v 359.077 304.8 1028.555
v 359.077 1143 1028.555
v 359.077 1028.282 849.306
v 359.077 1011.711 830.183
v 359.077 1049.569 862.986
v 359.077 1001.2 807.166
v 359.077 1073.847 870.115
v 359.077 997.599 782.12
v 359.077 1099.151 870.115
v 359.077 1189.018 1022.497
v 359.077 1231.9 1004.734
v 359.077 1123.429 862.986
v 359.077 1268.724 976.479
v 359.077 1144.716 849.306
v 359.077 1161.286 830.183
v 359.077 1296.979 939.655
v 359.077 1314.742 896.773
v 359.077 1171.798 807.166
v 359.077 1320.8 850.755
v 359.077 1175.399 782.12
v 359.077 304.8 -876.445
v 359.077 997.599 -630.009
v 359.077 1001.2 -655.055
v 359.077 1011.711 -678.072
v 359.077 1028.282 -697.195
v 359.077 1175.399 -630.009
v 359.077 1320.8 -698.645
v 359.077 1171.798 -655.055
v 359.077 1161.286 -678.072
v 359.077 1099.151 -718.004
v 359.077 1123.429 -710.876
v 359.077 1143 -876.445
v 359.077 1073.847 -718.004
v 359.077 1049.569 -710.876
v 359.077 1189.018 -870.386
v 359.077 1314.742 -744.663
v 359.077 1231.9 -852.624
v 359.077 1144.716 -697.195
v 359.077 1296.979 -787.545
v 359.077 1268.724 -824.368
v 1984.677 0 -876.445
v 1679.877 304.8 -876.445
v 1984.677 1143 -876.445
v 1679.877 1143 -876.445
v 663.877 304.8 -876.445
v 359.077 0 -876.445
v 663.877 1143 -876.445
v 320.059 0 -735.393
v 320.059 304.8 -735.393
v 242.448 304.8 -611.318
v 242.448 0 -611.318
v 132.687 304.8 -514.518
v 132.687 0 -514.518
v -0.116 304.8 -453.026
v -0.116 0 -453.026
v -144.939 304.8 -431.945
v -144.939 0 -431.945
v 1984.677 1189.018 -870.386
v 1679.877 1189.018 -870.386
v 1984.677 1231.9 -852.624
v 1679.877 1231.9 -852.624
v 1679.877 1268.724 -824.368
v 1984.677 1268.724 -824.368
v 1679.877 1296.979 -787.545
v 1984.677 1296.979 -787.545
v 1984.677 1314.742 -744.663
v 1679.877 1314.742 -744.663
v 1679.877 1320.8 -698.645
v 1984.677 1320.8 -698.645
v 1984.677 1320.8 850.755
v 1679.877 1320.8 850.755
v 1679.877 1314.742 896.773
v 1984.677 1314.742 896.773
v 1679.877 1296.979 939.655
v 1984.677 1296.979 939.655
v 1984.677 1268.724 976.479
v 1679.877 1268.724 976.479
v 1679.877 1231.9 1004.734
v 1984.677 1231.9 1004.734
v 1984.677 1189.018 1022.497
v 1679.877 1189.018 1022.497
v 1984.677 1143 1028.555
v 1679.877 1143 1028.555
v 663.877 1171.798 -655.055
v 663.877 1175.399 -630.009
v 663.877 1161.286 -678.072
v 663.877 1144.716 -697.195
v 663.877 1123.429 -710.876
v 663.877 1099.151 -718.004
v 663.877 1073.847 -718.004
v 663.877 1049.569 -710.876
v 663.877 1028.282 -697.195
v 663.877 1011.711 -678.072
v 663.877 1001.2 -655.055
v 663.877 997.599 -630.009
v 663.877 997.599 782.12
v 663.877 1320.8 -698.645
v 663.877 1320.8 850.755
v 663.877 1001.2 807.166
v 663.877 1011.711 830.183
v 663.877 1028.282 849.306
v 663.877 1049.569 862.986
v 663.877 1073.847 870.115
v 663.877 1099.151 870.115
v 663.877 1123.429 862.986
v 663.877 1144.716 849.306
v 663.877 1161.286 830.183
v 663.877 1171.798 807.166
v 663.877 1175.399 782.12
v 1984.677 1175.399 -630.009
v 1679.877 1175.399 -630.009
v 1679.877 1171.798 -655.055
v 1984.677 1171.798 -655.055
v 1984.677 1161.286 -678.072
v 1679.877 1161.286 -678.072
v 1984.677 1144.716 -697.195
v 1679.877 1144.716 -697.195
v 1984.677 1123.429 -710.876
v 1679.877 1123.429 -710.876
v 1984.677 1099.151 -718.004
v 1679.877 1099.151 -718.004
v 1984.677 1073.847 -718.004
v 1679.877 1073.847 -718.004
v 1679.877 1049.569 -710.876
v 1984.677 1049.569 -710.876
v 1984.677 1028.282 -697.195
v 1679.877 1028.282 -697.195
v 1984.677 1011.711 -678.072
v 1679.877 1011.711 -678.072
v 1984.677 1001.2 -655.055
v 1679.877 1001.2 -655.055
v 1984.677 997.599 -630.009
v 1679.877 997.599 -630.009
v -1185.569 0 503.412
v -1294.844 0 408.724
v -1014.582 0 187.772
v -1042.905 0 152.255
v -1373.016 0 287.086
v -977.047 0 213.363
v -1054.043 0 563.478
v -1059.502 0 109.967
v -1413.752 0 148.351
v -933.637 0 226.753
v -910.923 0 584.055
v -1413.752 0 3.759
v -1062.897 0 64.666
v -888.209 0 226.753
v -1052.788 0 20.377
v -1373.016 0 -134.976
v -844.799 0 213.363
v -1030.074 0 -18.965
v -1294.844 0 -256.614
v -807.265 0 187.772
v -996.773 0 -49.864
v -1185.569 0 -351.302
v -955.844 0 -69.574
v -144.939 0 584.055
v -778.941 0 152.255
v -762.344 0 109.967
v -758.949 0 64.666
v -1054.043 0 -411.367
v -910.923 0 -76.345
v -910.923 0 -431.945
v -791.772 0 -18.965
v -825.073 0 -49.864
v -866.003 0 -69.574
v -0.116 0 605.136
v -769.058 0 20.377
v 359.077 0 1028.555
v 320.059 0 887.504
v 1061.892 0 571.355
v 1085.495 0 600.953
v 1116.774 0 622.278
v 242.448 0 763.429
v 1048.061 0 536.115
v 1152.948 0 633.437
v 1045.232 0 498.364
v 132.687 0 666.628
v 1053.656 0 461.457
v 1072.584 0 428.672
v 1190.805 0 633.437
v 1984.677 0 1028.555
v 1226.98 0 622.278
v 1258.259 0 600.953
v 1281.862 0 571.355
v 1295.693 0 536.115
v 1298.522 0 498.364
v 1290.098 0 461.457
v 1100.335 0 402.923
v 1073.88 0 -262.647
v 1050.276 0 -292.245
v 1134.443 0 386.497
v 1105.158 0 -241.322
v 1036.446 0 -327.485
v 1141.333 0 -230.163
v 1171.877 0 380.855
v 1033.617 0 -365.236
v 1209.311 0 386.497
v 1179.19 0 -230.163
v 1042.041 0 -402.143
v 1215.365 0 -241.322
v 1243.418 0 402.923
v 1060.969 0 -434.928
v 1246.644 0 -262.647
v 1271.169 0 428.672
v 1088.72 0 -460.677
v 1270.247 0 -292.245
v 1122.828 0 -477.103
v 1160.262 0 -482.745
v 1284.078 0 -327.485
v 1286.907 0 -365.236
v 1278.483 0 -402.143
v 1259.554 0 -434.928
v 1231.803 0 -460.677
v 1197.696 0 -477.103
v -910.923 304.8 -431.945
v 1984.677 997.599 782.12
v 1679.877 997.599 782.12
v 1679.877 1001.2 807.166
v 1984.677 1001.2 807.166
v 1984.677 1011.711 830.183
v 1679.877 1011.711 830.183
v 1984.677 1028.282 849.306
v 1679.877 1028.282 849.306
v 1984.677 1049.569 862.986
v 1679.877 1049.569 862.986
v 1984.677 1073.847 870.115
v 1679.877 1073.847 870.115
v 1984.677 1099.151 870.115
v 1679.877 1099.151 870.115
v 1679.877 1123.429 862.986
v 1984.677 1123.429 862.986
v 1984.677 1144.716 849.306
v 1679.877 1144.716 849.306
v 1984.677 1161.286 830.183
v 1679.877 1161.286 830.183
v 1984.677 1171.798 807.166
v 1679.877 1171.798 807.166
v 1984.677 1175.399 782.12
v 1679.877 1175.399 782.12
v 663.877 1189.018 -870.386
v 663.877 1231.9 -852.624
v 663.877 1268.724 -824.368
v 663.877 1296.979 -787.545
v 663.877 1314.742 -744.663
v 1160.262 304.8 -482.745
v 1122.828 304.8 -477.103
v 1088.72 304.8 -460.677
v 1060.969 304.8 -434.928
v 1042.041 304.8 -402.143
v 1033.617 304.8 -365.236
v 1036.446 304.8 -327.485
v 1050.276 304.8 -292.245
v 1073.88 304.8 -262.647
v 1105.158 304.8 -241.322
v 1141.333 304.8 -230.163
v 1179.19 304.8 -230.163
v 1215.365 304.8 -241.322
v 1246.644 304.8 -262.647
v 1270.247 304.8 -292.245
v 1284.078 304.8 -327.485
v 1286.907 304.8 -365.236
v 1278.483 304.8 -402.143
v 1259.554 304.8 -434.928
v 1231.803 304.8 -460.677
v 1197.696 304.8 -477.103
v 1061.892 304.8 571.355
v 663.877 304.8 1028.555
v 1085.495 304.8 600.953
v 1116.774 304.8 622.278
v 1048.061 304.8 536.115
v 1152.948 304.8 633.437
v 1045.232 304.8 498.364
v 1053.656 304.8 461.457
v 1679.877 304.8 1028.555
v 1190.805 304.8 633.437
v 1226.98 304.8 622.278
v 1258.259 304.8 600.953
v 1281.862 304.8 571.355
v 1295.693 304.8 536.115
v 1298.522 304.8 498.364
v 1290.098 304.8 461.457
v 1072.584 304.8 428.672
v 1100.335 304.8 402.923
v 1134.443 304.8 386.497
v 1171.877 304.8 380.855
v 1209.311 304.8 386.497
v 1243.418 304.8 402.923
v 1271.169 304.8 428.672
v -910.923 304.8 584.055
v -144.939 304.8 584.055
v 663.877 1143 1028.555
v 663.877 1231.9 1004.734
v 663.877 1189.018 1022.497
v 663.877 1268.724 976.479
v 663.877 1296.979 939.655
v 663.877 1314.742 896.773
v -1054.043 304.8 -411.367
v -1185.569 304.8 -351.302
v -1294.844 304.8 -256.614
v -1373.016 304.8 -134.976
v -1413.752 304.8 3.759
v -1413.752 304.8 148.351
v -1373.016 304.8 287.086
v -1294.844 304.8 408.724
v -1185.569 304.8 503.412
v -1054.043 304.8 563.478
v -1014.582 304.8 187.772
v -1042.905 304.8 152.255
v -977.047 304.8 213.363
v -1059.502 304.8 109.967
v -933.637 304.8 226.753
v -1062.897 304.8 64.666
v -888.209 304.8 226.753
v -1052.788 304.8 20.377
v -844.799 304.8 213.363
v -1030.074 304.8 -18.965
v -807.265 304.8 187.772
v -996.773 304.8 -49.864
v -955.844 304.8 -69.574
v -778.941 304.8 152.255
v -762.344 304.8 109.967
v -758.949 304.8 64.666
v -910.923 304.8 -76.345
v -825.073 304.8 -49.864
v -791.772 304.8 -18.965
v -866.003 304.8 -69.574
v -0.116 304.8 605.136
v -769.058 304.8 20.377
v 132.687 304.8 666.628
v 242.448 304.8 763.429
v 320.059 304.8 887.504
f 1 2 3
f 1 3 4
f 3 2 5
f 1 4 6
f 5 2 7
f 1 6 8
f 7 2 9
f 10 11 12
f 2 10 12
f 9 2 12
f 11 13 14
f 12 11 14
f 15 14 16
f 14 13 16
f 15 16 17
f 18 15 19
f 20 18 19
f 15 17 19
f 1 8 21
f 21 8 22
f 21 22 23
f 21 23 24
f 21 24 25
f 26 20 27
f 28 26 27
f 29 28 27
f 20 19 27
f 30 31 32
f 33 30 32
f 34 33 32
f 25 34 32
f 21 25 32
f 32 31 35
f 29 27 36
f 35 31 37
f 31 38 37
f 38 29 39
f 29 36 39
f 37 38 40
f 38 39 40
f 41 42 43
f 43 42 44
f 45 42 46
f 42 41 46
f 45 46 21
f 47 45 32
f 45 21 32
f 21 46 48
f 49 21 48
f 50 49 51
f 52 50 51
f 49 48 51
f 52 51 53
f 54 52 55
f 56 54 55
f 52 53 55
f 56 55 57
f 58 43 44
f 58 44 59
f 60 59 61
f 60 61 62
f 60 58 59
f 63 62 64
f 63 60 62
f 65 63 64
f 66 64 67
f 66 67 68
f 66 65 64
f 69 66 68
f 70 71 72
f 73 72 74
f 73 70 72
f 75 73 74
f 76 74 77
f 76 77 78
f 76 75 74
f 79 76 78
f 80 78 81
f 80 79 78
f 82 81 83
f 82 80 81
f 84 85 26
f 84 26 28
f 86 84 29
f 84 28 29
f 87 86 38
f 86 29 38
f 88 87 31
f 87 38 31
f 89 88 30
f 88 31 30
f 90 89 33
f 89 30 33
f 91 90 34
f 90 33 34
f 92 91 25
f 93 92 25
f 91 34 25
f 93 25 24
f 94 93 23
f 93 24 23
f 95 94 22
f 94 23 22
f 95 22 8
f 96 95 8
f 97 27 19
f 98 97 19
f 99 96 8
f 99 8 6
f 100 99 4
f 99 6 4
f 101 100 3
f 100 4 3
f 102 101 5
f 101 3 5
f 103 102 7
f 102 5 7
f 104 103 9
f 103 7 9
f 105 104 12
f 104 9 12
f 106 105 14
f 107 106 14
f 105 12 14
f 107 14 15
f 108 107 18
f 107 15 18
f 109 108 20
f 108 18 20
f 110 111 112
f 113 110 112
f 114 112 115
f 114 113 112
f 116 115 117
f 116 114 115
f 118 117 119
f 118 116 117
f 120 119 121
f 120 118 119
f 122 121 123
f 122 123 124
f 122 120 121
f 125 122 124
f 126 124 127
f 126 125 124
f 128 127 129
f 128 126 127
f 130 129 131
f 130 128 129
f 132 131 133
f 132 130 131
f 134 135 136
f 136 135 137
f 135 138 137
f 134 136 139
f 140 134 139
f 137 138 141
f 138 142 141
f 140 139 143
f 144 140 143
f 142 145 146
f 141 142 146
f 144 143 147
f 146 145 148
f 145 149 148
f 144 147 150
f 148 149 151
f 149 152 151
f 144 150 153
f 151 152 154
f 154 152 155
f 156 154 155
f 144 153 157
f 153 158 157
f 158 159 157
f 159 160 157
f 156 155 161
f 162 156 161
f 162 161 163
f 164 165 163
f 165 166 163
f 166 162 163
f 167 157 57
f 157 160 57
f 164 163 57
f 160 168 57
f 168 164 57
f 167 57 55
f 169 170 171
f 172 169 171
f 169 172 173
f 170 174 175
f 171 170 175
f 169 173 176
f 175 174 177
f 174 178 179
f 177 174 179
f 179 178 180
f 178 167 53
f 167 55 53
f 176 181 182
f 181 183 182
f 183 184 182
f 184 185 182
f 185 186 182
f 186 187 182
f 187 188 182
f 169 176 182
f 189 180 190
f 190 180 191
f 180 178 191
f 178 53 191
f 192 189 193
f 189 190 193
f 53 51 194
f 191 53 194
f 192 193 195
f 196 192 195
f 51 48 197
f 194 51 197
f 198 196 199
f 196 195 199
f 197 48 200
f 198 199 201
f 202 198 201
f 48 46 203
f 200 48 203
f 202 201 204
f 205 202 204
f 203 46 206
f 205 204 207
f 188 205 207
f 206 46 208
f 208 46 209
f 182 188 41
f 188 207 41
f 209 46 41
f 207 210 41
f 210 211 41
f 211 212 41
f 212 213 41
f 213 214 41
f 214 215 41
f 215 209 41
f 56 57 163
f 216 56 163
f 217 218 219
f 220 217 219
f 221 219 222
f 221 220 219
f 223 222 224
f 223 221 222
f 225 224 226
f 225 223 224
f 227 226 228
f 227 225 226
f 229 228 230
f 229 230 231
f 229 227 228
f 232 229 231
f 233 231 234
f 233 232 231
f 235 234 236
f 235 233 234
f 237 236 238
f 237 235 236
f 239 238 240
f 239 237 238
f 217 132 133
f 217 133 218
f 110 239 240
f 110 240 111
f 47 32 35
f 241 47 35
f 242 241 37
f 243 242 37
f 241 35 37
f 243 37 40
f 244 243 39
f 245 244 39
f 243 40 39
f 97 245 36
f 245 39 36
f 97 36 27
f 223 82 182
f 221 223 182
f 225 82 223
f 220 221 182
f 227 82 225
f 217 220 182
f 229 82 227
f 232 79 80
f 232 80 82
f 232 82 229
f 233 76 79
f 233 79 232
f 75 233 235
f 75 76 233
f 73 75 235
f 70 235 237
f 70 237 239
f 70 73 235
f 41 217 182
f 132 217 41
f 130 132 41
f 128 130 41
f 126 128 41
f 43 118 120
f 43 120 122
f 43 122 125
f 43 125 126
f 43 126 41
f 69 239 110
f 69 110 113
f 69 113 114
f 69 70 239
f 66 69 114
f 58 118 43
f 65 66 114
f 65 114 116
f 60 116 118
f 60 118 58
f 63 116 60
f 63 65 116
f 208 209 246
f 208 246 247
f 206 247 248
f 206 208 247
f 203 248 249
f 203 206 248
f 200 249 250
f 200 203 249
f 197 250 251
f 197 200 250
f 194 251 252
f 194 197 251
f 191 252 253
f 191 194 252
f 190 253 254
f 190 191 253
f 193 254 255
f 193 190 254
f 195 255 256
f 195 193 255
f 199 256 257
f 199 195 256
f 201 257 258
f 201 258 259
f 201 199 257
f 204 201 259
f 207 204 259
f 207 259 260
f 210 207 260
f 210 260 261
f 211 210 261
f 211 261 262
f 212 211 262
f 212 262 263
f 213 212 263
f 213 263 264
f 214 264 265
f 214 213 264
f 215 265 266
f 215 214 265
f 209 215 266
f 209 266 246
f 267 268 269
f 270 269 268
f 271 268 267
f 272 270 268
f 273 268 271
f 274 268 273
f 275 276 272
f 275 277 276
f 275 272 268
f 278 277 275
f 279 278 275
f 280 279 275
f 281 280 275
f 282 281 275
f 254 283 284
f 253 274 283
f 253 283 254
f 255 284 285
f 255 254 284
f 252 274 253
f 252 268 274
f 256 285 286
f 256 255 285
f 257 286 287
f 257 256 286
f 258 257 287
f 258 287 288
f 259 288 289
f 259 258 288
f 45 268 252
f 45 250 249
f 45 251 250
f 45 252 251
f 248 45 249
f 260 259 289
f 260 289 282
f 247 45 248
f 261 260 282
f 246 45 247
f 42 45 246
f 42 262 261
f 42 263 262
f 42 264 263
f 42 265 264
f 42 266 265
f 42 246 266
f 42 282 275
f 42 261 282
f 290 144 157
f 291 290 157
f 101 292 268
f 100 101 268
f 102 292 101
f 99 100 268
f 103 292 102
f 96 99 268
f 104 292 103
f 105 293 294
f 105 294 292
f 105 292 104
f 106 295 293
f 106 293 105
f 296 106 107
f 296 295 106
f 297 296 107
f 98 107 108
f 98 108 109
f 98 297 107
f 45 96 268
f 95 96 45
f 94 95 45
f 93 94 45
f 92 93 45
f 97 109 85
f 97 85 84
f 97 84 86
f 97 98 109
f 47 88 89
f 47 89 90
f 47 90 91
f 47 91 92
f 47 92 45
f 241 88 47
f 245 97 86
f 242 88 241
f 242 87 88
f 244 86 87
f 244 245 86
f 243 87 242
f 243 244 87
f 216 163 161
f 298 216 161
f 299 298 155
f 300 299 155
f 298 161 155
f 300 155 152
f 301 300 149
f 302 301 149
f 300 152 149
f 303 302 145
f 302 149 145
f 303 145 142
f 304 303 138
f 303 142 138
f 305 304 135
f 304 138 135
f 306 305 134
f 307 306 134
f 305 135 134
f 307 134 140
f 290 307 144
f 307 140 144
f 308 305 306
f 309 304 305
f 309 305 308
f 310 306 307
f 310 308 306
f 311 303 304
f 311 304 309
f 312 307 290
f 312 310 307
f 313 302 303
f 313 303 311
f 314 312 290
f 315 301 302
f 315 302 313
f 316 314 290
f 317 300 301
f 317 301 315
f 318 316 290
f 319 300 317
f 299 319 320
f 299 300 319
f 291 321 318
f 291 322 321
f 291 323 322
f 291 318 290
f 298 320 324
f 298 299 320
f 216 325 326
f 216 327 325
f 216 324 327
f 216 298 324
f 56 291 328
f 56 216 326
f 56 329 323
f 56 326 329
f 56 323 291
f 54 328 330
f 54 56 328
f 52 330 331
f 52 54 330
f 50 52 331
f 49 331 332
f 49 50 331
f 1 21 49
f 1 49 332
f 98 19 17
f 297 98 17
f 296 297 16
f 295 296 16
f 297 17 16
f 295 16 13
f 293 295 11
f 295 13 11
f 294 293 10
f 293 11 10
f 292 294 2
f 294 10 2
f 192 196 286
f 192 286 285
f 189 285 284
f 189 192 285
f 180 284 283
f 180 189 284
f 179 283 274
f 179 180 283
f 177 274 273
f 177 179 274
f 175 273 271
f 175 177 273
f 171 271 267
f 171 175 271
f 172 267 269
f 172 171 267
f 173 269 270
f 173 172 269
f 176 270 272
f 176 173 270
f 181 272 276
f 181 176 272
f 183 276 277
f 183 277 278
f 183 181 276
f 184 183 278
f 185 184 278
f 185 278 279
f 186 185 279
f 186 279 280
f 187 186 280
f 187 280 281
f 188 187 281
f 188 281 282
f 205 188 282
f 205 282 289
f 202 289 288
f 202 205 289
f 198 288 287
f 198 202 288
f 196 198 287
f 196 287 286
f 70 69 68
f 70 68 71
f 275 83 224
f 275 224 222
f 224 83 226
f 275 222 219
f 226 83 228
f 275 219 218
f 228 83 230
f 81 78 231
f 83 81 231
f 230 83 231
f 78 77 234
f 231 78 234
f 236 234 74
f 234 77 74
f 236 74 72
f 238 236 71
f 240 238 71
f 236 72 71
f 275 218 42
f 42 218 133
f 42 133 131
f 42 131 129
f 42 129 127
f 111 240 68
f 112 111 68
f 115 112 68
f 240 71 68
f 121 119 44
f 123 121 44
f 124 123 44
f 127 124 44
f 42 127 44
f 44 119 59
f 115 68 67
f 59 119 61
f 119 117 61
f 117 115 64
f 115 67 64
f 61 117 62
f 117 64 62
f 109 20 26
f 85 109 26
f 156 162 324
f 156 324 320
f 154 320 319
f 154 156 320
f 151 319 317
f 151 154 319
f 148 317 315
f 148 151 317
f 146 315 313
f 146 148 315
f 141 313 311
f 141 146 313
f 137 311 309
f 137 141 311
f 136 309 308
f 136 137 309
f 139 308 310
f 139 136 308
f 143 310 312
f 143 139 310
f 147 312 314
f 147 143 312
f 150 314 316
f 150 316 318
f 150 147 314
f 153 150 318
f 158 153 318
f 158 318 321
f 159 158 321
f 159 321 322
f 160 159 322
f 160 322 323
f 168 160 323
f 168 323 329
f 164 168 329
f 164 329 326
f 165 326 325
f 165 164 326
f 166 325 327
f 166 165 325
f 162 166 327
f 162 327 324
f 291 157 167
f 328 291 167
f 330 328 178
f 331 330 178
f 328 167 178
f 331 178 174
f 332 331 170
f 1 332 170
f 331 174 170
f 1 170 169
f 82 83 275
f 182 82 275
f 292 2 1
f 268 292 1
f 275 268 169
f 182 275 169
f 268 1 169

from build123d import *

# Parameters (mm, degrees)
SKETCH_1_R      = 152.4
SKETCH_1_W      = 1625.6
SKETCH_1_H      = 1905
SKETCH_1_R_2    = 127
EXTRUDE_3_DEPTH = 304.8
EXTRUDE_5_DEPTH = 304.8


with BuildPart() as part:
    # 草图1 → 凸台-拉伸3 (new body)
    # profile 1 of 2: a face of its own
    with BuildSketch(Plane(origin=(0, 0, 0), x_dir=(1, 0, 0), z_dir=(0, 1, 0))):
        with BuildLine():
            Line((-910.923193916, -584.05513308), (-144.938818674, -584.05513308))
            ThreePointArc((-144.938818674, -584.05513308), (191.071597831, -711.05513308), (359.076806084, -1028.55513308))
            Line((359.076806084, -1028.55513308), (359.076806084, 876.44486692))
            ThreePointArc((359.076806084, 876.44486692), (191.071597831, 558.94486692), (-144.938818674, 431.94486692))
            Line((-144.938818674, 431.94486692), (-910.923193916, 431.94486692))
            ThreePointArc((-910.923193916, 431.94486692), (-1418.923193916, -76.05513308), (-910.923193916, -584.05513308))
        make_face()
        with Locations(Location((-910.923193916, -76.05513308, 0), (0, 0, 90))):
            Circle(SKETCH_1_R, mode=Mode.SUBTRACT)
    # profile 2 of 2: a face of its own
    with BuildSketch(Plane(origin=(0, 0, 0), x_dir=(1, 0, 0), z_dir=(0, 1, 0))):
        with Locations((1171.876806084, -76.05513308)):
            Rectangle(SKETCH_1_W, SKETCH_1_H)
        with Locations(Location((1160.261708617, 355.74486692, 0), (0, 0, 90))):
            Circle(SKETCH_1_R_2, mode=Mode.SUBTRACT)
        with Locations(Location((1171.876806084, -507.85513308, 0), (0, 0, 90))):
            Circle(SKETCH_1_R_2, mode=Mode.SUBTRACT)
    extrude(amount=EXTRUDE_3_DEPTH)

    # 草图30 → 凸台-拉伸5 (add)
    with BuildSketch(Plane(origin=(1984.676806084, 0, 0), x_dir=(0, 0, -1), z_dir=(1, 0, 0))):
        with BuildLine():
            Line((-1028.55513308, 304.8), (876.44486692, 304.8))
            Line((876.44486692, 304.8), (876.44486692, 1143))
            ThreePointArc((876.44486692, 1143), (824.368452615, 1268.723585695), (698.64486692, 1320.8))
            Line((698.64486692, 1320.8), (-850.75513308, 1320.8))
            ThreePointArc((-850.75513308, 1320.8), (-976.478718775, 1268.723585695), (-1028.55513308, 1143))
            Line((-1028.55513308, 1143), (-1028.55513308, 304.8))
        make_face()
        with BuildLine():
            Line((-782.119591201, 1175.398916904), (630.009325042, 1175.398916904))
            ThreePointArc((630.009325042, 1175.398916904), (718.909325042, 1086.498916904), (630.009325042, 997.598916904))
            Line((630.009325042, 997.598916904), (-782.119591201, 997.598916904))
            ThreePointArc((-782.119591201, 997.598916904), (-871.019591201, 1086.498916904), (-782.119591201, 1175.398916904))
        make_face(mode=Mode.SUBTRACT)
    extrude_5 = extrude(amount=-EXTRUDE_5_DEPTH)

    # 镜向2: 凸台-拉伸5 across plane
    add(extrude_5.mirror(Plane.ZY.offset(-1171.876806084)))


solid = part.part
